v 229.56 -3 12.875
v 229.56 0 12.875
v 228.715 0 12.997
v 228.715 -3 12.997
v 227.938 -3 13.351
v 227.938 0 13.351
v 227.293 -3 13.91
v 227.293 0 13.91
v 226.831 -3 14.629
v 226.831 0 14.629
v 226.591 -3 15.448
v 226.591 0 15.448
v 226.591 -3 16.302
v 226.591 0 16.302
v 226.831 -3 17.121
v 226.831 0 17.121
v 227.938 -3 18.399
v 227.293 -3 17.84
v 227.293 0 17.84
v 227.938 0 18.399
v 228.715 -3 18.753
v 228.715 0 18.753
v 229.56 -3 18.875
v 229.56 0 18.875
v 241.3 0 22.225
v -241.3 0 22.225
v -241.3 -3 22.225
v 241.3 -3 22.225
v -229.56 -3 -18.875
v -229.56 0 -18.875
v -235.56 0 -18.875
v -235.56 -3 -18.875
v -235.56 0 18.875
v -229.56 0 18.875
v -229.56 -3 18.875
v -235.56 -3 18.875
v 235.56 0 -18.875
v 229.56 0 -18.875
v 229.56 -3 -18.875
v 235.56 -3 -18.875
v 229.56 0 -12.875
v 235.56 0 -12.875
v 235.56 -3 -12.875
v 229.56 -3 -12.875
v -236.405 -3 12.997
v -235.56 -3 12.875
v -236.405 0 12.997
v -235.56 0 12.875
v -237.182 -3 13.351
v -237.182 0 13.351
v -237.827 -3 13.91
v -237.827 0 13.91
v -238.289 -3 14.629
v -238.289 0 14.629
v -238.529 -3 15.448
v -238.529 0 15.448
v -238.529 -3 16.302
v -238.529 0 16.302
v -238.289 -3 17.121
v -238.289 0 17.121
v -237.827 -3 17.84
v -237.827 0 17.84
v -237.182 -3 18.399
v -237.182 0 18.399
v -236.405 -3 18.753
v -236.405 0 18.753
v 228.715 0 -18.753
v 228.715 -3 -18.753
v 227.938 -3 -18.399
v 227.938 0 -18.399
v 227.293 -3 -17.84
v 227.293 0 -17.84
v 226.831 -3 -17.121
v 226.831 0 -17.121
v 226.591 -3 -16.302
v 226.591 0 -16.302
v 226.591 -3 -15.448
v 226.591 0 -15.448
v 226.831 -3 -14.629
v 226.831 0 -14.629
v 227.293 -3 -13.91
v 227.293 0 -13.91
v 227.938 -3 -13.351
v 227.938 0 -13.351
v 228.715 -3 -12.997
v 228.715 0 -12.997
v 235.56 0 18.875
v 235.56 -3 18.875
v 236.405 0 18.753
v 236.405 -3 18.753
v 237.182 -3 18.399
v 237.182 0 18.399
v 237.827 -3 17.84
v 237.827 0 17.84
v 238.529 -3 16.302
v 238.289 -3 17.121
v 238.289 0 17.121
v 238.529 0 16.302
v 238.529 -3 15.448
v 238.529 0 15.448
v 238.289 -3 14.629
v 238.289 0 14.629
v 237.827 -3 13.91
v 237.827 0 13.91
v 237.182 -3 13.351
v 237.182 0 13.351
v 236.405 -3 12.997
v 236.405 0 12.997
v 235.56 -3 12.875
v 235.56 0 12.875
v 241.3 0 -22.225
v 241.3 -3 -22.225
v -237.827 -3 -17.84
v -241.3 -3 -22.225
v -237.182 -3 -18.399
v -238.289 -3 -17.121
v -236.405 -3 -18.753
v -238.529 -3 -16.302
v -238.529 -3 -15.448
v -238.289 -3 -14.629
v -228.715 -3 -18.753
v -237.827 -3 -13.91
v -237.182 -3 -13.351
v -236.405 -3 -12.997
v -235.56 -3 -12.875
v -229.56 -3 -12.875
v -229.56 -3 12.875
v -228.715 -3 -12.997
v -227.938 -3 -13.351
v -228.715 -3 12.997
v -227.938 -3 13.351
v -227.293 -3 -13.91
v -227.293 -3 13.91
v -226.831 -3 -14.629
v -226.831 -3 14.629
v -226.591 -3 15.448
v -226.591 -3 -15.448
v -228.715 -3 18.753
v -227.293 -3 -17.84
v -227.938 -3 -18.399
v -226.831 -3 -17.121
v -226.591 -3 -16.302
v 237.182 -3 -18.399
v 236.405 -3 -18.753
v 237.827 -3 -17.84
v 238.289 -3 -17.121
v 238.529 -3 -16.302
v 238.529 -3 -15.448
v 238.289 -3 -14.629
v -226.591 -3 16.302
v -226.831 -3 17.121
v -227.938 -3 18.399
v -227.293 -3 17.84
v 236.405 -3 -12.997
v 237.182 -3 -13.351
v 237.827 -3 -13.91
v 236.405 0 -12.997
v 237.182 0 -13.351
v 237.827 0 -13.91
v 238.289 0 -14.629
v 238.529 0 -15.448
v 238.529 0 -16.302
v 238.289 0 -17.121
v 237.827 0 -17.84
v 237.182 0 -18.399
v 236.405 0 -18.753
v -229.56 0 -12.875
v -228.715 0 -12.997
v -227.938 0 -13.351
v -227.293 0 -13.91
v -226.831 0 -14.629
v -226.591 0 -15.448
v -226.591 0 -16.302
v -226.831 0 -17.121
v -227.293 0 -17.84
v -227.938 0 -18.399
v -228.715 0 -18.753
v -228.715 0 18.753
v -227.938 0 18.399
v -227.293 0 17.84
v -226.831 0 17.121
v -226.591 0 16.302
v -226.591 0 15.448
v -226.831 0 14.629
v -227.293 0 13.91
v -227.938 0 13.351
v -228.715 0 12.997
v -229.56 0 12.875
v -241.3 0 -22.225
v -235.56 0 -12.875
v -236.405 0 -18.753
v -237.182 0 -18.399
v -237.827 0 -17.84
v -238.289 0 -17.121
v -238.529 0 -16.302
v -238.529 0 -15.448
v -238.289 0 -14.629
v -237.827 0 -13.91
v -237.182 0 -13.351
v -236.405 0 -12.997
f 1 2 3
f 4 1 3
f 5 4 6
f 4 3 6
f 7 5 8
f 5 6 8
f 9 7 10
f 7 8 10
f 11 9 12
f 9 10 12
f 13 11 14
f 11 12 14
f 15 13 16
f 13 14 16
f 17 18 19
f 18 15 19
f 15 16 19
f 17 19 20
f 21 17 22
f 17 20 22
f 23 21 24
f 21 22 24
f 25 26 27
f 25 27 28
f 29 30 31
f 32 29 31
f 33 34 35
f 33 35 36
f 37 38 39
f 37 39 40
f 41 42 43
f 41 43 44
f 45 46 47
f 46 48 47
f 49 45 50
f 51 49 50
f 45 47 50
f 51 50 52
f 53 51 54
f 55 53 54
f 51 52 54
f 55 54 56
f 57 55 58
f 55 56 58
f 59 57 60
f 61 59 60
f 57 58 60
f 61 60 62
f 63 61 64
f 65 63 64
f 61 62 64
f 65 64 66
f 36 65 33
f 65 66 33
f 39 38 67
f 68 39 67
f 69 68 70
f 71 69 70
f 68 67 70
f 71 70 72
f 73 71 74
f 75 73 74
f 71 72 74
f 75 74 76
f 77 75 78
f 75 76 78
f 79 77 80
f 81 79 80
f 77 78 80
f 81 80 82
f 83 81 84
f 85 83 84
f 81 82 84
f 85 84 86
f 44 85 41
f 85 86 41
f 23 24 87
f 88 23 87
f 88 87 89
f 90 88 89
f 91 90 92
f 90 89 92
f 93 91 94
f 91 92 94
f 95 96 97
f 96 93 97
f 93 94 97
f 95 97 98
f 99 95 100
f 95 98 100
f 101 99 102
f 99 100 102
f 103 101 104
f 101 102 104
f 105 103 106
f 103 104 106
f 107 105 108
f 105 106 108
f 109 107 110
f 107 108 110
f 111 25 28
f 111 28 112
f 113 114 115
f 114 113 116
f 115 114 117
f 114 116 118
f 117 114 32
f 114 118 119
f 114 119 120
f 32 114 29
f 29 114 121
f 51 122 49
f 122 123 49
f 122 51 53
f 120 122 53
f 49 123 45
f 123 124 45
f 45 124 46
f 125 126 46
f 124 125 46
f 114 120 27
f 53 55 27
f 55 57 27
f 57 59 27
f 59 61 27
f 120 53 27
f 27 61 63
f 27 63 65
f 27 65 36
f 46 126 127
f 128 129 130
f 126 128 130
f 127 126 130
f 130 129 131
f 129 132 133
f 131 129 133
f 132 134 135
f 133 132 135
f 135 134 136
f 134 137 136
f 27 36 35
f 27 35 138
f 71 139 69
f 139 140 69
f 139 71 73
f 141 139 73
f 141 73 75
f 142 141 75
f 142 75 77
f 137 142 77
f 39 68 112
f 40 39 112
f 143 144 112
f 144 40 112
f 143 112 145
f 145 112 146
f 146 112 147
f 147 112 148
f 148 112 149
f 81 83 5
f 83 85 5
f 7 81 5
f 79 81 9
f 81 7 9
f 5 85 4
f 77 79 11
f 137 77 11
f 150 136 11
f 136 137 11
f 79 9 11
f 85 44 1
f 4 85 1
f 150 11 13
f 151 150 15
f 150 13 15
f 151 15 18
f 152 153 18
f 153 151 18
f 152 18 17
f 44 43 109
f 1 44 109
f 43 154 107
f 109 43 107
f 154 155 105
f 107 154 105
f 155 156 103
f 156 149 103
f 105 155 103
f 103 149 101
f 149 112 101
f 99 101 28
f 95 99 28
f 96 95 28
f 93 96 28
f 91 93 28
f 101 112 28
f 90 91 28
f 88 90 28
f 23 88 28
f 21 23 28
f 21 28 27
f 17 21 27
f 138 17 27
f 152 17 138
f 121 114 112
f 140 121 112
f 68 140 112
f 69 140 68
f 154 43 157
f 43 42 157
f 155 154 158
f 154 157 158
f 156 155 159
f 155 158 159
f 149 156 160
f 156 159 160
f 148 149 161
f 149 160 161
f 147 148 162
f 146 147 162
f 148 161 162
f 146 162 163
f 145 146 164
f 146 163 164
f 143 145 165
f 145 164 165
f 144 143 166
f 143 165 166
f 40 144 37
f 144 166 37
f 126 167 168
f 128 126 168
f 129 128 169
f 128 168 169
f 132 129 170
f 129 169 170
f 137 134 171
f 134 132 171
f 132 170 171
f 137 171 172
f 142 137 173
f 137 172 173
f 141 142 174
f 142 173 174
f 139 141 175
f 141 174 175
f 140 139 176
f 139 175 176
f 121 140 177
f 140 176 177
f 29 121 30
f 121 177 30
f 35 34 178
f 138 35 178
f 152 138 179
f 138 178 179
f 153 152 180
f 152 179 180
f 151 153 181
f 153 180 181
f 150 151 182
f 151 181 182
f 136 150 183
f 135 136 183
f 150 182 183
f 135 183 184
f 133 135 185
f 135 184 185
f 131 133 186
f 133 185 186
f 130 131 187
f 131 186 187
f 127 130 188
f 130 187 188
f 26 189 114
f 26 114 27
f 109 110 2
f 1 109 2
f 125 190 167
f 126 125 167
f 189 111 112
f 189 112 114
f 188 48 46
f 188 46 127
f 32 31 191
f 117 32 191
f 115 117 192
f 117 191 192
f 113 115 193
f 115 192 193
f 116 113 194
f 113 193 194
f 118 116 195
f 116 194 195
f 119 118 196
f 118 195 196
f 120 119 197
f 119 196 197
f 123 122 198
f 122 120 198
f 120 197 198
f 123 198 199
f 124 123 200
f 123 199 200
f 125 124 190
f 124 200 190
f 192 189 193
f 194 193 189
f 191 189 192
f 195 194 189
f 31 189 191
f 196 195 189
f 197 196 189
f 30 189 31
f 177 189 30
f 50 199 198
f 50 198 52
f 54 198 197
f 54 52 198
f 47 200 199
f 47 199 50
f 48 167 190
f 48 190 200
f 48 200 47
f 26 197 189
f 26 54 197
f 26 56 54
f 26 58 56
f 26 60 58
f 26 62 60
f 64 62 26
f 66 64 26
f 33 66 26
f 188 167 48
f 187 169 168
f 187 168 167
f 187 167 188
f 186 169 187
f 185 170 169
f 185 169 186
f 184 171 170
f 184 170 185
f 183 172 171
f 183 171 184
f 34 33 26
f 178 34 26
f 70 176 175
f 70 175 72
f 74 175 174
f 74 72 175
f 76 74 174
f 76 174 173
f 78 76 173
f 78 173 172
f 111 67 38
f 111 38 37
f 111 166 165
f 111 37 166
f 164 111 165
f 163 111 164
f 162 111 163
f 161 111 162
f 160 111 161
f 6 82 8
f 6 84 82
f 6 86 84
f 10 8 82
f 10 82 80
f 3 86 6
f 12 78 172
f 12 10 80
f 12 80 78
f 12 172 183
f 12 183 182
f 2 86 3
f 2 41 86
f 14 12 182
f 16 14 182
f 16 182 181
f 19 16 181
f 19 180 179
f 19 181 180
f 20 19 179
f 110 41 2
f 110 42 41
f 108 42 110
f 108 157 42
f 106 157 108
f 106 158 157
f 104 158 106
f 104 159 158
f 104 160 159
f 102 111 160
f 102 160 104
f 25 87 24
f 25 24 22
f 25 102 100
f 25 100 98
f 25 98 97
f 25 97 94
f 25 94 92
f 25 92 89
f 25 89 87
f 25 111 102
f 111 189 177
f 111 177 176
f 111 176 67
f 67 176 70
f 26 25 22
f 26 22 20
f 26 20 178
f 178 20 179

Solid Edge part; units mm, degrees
sketch "Sketch1" plane through (0, 0, 0) normal (0, -1, 0) x (1, 0, 0)
  arc A0 (235.56, 12.875) -> (235.56, 18.875) centre (235.56, 15.875) ccw
  line L0 (229.56, 18.875) -> (235.56, 18.875)
  arc A1 (229.56, 18.875) -> (229.56, 12.875) centre (229.56, 15.875) ccw
  line L1 (235.56, 12.875) -> (229.56, 12.875)
  arc A2 (-235.56, -12.875) -> (-235.56, -18.875) centre (-235.56, -15.875) ccw
  line L2 (-229.56, -18.875) -> (-235.56, -18.875)
  arc A3 (-229.56, -18.875) -> (-229.56, -12.875) centre (-229.56, -15.875) ccw
  line L3 (-235.56, -12.875) -> (-229.56, -12.875)
  line L4 (-241.3, -22.225) -> (-241.3, 22.225)
  line L5 (-241.3, 22.225) -> (241.3, 22.225)
  line L6 (241.3, 22.225) -> (241.3, -22.225)
  line L7 (241.3, -22.225) -> (-241.3, -22.225)
  line L8 (235.56, -12.875) -> (229.56, -12.875)
  arc A4 (229.56, -18.875) -> (229.56, -12.875) centre (229.56, -15.875) cw
  line L9 (229.56, -18.875) -> (235.56, -18.875)
  arc A5 (235.56, -12.875) -> (235.56, -18.875) centre (235.56, -15.875) cw
  line L10 (-235.56, 12.875) -> (-229.56, 12.875)
  arc A6 (-229.56, 18.875) -> (-229.56, 12.875) centre (-229.56, 15.875) cw
  line L11 (-229.56, 18.875) -> (-235.56, 18.875)
  arc A7 (-235.56, 12.875) -> (-235.56, 18.875) centre (-235.56, 15.875) cw
  dimension "D1" = 482.6
  dimension "D2" = 12
  dimension "D3" = 15.875
  dimension "D4" = 6
  dimension "D5" = 3
  dimension "D6" = 44.45
extrude "Protrusion1" add sketch "Sketch1" along normal blind 3
